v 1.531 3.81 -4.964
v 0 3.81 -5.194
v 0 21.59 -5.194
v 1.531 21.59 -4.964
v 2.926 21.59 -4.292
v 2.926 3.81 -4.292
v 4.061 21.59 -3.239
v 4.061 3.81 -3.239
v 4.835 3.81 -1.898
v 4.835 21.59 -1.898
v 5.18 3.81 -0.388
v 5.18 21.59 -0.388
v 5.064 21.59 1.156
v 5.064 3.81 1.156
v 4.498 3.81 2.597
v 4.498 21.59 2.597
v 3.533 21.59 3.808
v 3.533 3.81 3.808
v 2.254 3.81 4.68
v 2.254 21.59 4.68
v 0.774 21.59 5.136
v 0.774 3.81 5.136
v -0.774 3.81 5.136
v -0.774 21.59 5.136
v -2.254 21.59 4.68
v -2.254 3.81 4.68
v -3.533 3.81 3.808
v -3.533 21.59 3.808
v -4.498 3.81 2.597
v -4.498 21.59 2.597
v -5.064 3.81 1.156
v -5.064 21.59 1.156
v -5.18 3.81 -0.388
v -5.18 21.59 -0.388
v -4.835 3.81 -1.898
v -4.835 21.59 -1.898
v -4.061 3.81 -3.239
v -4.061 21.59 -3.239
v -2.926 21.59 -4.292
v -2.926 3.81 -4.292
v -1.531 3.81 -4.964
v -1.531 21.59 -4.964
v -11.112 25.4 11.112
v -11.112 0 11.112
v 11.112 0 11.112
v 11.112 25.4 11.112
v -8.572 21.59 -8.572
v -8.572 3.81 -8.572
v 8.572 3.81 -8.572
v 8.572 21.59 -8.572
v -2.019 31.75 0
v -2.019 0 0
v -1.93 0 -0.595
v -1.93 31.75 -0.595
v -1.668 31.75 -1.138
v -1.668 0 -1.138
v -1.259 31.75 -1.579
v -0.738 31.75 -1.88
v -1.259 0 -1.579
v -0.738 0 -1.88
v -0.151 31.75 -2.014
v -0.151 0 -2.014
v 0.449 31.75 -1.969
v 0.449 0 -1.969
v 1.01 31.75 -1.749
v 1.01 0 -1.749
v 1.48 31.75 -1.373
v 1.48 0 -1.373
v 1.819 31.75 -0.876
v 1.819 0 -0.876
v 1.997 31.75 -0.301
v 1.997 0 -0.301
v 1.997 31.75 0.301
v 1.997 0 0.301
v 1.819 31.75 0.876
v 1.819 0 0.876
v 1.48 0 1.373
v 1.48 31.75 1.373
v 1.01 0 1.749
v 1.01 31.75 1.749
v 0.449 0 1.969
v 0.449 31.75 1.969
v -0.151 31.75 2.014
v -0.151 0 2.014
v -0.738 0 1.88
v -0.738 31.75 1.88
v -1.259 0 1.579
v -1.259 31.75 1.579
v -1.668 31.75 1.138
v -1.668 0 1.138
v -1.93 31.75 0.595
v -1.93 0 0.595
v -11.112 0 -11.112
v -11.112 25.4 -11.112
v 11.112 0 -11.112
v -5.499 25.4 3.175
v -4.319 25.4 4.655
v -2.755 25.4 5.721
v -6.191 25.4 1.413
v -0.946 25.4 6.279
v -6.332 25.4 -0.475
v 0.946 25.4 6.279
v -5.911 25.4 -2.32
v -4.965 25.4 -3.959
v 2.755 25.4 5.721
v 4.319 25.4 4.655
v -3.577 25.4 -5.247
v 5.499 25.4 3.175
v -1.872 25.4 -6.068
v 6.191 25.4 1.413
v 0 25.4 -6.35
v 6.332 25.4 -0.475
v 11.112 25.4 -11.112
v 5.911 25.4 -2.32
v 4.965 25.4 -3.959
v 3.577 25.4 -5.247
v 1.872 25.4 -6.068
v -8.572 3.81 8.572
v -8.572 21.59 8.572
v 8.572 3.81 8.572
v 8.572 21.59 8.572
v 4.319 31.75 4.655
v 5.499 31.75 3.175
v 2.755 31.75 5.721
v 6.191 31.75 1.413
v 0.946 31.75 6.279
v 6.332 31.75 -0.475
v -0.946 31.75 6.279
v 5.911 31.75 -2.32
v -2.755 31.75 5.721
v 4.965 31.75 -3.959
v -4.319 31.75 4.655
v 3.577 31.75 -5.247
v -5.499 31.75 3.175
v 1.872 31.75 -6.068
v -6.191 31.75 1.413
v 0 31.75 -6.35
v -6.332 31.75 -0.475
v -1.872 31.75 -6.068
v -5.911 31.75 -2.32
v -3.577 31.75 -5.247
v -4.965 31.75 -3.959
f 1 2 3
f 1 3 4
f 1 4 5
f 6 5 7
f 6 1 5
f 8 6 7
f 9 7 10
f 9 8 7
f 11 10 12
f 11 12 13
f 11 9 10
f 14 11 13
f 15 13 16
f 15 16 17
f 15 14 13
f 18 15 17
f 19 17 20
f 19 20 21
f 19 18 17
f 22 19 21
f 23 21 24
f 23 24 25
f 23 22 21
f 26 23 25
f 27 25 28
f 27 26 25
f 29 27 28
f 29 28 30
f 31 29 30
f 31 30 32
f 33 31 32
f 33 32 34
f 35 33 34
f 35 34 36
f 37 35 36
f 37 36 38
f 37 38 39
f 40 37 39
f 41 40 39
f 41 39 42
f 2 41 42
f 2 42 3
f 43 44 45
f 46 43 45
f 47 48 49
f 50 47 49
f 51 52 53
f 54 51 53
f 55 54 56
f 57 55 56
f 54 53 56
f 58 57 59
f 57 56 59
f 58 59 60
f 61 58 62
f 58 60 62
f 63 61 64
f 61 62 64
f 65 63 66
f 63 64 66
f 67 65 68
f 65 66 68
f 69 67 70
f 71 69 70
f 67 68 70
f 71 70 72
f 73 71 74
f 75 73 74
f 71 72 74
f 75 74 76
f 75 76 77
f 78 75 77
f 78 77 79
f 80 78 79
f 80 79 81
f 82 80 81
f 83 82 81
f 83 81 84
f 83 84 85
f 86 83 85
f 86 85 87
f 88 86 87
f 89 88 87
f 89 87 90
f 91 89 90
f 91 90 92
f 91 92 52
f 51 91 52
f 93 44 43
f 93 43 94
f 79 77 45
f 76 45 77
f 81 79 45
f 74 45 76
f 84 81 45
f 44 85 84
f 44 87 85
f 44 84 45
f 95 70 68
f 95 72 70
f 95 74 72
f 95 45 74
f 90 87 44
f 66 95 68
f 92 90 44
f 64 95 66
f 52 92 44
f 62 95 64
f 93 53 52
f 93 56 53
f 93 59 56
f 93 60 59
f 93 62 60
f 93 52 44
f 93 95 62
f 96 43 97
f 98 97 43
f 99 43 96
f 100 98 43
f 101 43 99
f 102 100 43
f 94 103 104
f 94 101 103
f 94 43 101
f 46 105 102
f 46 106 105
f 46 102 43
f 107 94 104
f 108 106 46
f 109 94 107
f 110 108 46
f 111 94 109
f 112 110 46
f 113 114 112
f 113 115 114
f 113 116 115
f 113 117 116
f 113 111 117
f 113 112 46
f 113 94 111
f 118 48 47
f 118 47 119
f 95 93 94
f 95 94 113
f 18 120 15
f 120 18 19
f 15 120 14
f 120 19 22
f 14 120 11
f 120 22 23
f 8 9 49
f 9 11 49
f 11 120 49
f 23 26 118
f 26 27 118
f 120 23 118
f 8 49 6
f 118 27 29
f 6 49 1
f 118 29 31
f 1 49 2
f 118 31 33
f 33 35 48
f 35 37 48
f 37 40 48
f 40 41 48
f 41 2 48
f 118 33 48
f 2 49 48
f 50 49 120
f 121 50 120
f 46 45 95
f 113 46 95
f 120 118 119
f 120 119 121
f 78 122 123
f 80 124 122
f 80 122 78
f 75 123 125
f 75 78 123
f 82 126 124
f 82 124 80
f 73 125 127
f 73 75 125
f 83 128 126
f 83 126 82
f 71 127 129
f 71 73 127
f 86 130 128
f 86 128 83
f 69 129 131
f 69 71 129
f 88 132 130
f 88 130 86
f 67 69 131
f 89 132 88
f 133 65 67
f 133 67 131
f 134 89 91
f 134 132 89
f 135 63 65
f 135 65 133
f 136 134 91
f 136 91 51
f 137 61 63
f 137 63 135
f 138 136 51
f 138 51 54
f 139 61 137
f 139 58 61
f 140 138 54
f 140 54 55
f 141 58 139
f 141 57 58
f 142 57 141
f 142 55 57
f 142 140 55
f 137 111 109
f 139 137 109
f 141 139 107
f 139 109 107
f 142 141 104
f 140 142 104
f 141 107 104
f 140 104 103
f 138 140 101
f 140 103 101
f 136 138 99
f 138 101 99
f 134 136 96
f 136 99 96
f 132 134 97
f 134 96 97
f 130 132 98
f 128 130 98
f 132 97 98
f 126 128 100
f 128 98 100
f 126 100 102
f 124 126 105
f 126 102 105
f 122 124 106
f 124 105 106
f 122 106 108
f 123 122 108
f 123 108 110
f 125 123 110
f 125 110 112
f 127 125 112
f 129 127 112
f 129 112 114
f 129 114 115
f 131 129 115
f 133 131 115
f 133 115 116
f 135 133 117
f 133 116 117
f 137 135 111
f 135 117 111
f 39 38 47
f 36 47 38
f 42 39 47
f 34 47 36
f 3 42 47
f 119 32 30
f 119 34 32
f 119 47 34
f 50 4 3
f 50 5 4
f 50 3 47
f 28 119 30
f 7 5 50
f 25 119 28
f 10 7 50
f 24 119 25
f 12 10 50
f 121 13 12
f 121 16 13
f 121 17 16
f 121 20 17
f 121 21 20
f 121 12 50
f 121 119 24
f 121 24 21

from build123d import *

# Parameters (mm, degrees)
SKETCH1_W              = 22.225
SKETCH1_H              = 22.225
BOSS_EXTRUDE1_DEPTH    = 25.4
SKETCH2_R              = 6.35
BOSS_EXTRUDE2_DEPTH    = 6.35
F_10_32_TAPPED_HOLE1_D = 4.0386
SKETCH6_W              = 17.145
SKETCH6_H              = 17.145
SKETCH6_R              = 5.1943
CUT_EXTRUDE1_DEPTH     = 21.59
SKETCH7_W              = 17.145
SKETCH7_H              = 17.145
SKETCH7_R              = 5.1943
BOSS_EXTRUDE3_DEPTH    = 3.81


with BuildPart() as part:
    # Sketch1 → Boss-Extrude1 (new body)
    with BuildSketch(Plane(origin=(0, 0, 0), x_dir=(1, 0, 0), z_dir=(0, 1, 0))):
        Rectangle(SKETCH1_W, SKETCH1_H)
    extrude(amount=BOSS_EXTRUDE1_DEPTH)

    # Sketch2 → Boss-Extrude2 (add)
    with BuildSketch(Plane(origin=(0, 25.4, 0), x_dir=(1, 0, 0), z_dir=(0, 1, 0))):
        with Locations(Location((0, 0, 0), (0, 0, 90))):
            Circle(SKETCH2_R)
    extrude(amount=BOSS_EXTRUDE2_DEPTH)

    # #10-32 Tapped Hole1 (through all)
    with Locations(Plane(origin=(0, 31.75, 0), x_dir=(1, 0, 0), z_dir=(0, 1, 0))):
        with Locations((0, 0)):
            Hole(F_10_32_TAPPED_HOLE1_D / 2)

    # Sketch6 → Cut-Extrude1 (cut)
    with BuildSketch(Plane.XZ):
        Rectangle(SKETCH6_W, SKETCH6_H)
        with Locations(Location((0, 0, 0), (0, 0, 270))):
            Circle(SKETCH6_R, mode=Mode.SUBTRACT)
    extrude(amount=-CUT_EXTRUDE1_DEPTH, mode=Mode.SUBTRACT)

    # Sketch7 → Boss-Extrude3 (add)
    with BuildSketch(Plane(origin=(0, 0, 0), x_dir=(-1, 0, 0), z_dir=(0, -1, 0))):
        Rectangle(SKETCH7_W, SKETCH7_H)
        with Locations(Location((0, 0, 0), (0, 0, 90))):
            Circle(SKETCH7_R, mode=Mode.SUBTRACT)
    extrude(amount=-BOSS_EXTRUDE3_DEPTH)


solid = part.part
